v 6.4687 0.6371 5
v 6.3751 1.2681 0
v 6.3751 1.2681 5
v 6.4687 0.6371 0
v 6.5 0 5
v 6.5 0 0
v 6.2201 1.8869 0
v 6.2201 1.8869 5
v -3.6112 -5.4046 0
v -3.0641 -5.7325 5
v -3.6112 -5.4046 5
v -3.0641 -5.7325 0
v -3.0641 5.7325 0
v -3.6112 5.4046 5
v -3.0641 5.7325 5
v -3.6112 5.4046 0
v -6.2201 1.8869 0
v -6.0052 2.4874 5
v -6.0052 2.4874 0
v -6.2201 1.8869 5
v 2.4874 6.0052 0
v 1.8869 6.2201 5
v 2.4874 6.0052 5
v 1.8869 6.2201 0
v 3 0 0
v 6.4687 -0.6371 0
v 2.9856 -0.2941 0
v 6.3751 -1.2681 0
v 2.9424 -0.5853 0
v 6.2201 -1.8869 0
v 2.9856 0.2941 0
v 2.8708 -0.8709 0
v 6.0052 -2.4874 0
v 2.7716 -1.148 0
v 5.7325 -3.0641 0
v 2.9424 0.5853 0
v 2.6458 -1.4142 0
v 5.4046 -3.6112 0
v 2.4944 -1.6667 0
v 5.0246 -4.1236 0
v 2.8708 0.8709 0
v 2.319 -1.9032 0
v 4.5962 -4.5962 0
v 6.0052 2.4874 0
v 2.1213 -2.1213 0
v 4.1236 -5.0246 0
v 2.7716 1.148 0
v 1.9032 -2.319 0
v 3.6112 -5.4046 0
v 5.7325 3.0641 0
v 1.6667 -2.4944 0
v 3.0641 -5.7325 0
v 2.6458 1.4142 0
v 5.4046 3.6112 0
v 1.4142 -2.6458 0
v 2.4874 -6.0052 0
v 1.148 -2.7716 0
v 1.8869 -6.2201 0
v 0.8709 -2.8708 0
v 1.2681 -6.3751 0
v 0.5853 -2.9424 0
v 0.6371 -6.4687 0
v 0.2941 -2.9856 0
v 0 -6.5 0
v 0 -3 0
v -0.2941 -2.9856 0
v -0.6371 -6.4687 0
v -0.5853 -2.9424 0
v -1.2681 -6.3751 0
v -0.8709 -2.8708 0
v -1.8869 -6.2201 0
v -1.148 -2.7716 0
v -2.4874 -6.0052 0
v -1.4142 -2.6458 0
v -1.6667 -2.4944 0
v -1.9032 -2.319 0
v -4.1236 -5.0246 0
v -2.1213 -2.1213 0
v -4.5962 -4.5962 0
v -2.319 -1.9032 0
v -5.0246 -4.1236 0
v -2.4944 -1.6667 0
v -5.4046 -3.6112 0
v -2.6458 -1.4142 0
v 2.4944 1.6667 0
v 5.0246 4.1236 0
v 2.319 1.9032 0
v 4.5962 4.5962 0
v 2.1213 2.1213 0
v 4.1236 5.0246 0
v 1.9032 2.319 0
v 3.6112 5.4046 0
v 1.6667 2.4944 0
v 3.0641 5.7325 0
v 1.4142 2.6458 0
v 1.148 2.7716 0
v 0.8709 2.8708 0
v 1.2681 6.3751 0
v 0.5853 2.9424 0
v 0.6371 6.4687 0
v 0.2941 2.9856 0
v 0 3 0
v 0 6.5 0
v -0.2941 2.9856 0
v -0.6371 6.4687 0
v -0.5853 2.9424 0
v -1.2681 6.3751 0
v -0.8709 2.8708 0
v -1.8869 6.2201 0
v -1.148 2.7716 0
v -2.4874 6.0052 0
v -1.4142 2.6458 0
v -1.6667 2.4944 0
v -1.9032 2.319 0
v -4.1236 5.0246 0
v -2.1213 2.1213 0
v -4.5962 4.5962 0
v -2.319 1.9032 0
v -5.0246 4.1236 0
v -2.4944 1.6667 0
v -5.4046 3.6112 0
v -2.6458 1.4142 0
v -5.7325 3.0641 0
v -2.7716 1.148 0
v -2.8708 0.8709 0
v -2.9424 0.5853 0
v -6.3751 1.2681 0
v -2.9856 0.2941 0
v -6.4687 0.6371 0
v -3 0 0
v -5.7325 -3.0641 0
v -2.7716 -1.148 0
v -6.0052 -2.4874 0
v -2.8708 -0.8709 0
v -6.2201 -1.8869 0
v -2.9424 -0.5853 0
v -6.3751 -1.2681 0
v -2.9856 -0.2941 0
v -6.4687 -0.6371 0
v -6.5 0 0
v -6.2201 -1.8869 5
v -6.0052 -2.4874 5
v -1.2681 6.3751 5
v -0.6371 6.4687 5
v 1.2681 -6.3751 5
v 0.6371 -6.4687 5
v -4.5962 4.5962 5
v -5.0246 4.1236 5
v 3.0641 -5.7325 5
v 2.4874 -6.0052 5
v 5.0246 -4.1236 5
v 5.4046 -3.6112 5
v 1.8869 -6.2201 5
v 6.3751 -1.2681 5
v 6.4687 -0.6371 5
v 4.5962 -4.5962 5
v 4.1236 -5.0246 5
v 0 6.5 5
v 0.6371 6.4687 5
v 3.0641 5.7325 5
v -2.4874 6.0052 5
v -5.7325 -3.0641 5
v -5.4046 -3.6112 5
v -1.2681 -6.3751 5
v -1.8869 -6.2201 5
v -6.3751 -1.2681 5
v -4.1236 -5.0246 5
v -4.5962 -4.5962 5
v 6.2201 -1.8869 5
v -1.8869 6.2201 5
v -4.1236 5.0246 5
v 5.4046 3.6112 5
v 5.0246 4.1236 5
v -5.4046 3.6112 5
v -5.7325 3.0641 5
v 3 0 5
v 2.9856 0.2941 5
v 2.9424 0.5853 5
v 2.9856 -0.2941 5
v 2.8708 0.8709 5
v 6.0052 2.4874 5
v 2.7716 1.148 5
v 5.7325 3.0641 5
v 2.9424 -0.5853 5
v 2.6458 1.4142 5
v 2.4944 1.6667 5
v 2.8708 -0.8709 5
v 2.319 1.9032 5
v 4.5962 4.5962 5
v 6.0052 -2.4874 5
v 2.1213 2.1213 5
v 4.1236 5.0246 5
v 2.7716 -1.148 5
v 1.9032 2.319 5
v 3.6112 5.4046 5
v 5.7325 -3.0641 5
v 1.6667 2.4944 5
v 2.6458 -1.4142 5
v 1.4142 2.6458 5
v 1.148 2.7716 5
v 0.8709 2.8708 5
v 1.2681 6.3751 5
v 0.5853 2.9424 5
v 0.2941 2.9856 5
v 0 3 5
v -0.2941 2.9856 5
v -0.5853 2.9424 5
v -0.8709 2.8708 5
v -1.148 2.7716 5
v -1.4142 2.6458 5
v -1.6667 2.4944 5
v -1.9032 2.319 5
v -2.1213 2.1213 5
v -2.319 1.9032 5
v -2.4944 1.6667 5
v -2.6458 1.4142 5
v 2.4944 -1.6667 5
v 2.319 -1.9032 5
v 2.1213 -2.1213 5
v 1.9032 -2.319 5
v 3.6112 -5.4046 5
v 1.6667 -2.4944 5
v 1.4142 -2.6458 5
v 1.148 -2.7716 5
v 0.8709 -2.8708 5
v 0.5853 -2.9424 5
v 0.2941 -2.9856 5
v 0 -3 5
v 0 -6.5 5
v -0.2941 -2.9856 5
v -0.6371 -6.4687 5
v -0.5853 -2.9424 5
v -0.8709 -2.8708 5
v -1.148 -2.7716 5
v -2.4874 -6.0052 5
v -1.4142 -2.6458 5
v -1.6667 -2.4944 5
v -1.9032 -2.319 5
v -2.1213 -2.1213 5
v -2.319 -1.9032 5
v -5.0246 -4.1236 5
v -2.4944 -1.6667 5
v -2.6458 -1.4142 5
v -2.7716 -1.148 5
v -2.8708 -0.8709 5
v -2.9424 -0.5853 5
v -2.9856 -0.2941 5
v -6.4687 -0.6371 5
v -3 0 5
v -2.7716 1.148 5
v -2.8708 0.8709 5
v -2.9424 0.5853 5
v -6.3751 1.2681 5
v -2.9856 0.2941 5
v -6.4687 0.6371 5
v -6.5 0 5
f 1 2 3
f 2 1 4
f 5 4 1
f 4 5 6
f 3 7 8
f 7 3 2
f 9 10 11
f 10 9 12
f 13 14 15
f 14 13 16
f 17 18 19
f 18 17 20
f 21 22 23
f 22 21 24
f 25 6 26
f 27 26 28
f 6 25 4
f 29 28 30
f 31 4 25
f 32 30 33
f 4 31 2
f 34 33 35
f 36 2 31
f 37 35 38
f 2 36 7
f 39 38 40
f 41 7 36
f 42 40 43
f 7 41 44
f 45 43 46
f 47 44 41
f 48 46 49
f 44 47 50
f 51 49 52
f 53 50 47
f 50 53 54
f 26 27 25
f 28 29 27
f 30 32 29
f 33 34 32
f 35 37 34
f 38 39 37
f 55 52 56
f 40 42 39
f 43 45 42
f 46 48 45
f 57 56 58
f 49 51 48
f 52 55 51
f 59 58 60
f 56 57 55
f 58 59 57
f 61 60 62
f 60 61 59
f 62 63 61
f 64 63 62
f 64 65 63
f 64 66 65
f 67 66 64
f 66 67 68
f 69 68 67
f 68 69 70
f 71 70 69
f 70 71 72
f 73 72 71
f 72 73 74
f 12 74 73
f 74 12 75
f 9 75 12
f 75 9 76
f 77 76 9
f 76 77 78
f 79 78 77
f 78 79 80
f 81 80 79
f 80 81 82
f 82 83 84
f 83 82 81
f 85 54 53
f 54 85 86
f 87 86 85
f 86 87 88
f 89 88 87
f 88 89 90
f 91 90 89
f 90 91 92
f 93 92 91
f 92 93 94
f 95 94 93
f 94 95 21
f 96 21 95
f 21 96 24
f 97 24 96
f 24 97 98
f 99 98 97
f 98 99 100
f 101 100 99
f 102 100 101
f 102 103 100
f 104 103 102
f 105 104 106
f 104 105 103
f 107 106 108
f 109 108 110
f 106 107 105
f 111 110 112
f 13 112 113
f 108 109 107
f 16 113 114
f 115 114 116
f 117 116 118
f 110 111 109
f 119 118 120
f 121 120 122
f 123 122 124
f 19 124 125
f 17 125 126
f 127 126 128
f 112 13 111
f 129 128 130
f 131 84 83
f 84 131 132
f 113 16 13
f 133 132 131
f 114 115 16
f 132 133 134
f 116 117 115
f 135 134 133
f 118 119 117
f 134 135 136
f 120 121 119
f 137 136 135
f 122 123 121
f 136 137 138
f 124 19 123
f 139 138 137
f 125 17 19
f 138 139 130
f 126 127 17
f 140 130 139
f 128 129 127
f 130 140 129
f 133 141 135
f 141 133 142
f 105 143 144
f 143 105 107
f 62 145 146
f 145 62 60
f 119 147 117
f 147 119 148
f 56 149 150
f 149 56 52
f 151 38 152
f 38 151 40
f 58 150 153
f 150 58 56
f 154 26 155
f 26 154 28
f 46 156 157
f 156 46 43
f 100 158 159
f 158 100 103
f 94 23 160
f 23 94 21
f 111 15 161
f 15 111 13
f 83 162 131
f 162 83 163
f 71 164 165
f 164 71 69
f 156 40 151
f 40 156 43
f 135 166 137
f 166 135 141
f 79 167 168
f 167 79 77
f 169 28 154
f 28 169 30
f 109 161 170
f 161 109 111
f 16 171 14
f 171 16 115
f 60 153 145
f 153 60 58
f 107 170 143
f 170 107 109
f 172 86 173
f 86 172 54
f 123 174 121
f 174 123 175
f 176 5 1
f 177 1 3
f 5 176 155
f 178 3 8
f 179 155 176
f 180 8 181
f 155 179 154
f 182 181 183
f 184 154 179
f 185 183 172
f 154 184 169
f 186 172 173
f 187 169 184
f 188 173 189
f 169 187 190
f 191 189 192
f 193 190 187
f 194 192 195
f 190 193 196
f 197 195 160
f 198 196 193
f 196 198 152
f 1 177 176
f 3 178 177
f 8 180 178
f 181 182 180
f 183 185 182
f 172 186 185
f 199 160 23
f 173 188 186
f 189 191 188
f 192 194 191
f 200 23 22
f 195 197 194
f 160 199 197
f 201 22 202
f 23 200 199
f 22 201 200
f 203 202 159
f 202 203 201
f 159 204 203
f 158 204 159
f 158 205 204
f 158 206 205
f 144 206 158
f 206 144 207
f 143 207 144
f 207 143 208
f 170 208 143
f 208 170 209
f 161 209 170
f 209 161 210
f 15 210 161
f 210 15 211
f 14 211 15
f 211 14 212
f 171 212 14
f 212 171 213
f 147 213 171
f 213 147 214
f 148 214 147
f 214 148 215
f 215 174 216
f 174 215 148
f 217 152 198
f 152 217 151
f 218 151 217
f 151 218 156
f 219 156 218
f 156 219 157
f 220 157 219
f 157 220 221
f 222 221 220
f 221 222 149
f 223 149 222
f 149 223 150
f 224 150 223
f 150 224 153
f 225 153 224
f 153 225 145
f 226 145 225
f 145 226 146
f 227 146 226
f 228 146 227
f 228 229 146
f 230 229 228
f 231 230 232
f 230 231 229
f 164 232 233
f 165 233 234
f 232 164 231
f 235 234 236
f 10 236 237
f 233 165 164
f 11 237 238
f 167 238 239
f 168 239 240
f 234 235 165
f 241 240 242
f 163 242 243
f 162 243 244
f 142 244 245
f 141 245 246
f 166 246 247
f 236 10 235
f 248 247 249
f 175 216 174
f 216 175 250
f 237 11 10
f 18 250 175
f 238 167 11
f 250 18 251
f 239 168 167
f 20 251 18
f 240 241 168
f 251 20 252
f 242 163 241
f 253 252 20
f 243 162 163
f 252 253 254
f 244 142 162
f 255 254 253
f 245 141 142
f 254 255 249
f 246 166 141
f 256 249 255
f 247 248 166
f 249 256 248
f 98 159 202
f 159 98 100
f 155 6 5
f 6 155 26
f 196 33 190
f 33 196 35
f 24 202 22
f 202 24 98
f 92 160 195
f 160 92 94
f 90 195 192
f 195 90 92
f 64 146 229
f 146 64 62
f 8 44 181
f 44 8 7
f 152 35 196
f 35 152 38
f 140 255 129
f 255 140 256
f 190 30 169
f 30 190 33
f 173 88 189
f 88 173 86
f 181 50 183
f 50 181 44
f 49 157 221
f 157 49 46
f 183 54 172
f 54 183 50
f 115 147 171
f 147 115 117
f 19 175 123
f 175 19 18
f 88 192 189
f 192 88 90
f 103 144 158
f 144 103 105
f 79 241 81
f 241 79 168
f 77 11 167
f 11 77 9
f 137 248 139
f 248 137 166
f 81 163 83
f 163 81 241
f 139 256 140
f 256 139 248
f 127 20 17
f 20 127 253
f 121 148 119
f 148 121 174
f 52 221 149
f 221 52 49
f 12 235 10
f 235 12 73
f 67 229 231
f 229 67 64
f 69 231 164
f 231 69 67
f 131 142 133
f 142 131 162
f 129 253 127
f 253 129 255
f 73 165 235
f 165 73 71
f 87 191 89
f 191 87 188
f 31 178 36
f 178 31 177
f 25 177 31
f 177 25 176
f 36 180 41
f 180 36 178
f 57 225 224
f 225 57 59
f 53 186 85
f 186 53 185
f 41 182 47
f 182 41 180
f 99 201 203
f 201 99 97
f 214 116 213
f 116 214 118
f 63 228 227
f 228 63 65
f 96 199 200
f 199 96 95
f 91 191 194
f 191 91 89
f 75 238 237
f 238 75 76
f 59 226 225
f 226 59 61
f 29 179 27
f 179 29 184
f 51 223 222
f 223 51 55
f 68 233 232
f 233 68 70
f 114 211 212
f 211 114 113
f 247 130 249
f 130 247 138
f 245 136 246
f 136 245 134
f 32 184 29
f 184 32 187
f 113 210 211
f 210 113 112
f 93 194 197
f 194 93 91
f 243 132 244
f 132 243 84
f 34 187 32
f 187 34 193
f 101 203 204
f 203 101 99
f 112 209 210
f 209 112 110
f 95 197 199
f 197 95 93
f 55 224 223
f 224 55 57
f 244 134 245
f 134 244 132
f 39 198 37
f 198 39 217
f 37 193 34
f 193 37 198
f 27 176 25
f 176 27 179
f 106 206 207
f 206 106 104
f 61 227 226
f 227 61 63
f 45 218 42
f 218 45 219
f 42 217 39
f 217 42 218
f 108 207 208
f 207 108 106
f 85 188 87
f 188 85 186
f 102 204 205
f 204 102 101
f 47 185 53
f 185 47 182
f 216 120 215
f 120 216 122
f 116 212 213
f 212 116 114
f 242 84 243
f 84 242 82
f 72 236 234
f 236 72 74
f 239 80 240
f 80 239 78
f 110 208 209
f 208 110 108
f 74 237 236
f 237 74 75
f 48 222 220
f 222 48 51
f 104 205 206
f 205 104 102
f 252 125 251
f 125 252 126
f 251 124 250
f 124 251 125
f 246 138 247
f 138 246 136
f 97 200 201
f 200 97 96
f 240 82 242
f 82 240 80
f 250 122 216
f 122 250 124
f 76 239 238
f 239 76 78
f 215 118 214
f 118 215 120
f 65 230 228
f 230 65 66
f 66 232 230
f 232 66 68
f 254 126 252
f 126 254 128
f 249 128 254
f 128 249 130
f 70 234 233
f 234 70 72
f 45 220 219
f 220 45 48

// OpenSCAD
module ball_bearing() {
    difference() {
        // Outer cylinder
        cylinder(d=13.0, h=5.0, $fn=64);
        
        // Inner bore
        translate([0, 0, -1])
            cylinder(d=6.0, h=7.0, $fn=64);
    }
}

ball_bearing();
